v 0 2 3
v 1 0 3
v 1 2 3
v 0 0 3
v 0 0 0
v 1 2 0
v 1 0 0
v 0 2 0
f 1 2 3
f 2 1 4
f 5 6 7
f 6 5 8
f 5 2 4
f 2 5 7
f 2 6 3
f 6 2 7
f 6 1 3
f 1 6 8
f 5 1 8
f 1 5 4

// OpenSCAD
/* Creates a cuboid
 * with the provided
 * dimensions
 */
module oblong(length,width,height) {
// a cuboid
cube([length,width,height]);
}
oblong(1,2,3);
